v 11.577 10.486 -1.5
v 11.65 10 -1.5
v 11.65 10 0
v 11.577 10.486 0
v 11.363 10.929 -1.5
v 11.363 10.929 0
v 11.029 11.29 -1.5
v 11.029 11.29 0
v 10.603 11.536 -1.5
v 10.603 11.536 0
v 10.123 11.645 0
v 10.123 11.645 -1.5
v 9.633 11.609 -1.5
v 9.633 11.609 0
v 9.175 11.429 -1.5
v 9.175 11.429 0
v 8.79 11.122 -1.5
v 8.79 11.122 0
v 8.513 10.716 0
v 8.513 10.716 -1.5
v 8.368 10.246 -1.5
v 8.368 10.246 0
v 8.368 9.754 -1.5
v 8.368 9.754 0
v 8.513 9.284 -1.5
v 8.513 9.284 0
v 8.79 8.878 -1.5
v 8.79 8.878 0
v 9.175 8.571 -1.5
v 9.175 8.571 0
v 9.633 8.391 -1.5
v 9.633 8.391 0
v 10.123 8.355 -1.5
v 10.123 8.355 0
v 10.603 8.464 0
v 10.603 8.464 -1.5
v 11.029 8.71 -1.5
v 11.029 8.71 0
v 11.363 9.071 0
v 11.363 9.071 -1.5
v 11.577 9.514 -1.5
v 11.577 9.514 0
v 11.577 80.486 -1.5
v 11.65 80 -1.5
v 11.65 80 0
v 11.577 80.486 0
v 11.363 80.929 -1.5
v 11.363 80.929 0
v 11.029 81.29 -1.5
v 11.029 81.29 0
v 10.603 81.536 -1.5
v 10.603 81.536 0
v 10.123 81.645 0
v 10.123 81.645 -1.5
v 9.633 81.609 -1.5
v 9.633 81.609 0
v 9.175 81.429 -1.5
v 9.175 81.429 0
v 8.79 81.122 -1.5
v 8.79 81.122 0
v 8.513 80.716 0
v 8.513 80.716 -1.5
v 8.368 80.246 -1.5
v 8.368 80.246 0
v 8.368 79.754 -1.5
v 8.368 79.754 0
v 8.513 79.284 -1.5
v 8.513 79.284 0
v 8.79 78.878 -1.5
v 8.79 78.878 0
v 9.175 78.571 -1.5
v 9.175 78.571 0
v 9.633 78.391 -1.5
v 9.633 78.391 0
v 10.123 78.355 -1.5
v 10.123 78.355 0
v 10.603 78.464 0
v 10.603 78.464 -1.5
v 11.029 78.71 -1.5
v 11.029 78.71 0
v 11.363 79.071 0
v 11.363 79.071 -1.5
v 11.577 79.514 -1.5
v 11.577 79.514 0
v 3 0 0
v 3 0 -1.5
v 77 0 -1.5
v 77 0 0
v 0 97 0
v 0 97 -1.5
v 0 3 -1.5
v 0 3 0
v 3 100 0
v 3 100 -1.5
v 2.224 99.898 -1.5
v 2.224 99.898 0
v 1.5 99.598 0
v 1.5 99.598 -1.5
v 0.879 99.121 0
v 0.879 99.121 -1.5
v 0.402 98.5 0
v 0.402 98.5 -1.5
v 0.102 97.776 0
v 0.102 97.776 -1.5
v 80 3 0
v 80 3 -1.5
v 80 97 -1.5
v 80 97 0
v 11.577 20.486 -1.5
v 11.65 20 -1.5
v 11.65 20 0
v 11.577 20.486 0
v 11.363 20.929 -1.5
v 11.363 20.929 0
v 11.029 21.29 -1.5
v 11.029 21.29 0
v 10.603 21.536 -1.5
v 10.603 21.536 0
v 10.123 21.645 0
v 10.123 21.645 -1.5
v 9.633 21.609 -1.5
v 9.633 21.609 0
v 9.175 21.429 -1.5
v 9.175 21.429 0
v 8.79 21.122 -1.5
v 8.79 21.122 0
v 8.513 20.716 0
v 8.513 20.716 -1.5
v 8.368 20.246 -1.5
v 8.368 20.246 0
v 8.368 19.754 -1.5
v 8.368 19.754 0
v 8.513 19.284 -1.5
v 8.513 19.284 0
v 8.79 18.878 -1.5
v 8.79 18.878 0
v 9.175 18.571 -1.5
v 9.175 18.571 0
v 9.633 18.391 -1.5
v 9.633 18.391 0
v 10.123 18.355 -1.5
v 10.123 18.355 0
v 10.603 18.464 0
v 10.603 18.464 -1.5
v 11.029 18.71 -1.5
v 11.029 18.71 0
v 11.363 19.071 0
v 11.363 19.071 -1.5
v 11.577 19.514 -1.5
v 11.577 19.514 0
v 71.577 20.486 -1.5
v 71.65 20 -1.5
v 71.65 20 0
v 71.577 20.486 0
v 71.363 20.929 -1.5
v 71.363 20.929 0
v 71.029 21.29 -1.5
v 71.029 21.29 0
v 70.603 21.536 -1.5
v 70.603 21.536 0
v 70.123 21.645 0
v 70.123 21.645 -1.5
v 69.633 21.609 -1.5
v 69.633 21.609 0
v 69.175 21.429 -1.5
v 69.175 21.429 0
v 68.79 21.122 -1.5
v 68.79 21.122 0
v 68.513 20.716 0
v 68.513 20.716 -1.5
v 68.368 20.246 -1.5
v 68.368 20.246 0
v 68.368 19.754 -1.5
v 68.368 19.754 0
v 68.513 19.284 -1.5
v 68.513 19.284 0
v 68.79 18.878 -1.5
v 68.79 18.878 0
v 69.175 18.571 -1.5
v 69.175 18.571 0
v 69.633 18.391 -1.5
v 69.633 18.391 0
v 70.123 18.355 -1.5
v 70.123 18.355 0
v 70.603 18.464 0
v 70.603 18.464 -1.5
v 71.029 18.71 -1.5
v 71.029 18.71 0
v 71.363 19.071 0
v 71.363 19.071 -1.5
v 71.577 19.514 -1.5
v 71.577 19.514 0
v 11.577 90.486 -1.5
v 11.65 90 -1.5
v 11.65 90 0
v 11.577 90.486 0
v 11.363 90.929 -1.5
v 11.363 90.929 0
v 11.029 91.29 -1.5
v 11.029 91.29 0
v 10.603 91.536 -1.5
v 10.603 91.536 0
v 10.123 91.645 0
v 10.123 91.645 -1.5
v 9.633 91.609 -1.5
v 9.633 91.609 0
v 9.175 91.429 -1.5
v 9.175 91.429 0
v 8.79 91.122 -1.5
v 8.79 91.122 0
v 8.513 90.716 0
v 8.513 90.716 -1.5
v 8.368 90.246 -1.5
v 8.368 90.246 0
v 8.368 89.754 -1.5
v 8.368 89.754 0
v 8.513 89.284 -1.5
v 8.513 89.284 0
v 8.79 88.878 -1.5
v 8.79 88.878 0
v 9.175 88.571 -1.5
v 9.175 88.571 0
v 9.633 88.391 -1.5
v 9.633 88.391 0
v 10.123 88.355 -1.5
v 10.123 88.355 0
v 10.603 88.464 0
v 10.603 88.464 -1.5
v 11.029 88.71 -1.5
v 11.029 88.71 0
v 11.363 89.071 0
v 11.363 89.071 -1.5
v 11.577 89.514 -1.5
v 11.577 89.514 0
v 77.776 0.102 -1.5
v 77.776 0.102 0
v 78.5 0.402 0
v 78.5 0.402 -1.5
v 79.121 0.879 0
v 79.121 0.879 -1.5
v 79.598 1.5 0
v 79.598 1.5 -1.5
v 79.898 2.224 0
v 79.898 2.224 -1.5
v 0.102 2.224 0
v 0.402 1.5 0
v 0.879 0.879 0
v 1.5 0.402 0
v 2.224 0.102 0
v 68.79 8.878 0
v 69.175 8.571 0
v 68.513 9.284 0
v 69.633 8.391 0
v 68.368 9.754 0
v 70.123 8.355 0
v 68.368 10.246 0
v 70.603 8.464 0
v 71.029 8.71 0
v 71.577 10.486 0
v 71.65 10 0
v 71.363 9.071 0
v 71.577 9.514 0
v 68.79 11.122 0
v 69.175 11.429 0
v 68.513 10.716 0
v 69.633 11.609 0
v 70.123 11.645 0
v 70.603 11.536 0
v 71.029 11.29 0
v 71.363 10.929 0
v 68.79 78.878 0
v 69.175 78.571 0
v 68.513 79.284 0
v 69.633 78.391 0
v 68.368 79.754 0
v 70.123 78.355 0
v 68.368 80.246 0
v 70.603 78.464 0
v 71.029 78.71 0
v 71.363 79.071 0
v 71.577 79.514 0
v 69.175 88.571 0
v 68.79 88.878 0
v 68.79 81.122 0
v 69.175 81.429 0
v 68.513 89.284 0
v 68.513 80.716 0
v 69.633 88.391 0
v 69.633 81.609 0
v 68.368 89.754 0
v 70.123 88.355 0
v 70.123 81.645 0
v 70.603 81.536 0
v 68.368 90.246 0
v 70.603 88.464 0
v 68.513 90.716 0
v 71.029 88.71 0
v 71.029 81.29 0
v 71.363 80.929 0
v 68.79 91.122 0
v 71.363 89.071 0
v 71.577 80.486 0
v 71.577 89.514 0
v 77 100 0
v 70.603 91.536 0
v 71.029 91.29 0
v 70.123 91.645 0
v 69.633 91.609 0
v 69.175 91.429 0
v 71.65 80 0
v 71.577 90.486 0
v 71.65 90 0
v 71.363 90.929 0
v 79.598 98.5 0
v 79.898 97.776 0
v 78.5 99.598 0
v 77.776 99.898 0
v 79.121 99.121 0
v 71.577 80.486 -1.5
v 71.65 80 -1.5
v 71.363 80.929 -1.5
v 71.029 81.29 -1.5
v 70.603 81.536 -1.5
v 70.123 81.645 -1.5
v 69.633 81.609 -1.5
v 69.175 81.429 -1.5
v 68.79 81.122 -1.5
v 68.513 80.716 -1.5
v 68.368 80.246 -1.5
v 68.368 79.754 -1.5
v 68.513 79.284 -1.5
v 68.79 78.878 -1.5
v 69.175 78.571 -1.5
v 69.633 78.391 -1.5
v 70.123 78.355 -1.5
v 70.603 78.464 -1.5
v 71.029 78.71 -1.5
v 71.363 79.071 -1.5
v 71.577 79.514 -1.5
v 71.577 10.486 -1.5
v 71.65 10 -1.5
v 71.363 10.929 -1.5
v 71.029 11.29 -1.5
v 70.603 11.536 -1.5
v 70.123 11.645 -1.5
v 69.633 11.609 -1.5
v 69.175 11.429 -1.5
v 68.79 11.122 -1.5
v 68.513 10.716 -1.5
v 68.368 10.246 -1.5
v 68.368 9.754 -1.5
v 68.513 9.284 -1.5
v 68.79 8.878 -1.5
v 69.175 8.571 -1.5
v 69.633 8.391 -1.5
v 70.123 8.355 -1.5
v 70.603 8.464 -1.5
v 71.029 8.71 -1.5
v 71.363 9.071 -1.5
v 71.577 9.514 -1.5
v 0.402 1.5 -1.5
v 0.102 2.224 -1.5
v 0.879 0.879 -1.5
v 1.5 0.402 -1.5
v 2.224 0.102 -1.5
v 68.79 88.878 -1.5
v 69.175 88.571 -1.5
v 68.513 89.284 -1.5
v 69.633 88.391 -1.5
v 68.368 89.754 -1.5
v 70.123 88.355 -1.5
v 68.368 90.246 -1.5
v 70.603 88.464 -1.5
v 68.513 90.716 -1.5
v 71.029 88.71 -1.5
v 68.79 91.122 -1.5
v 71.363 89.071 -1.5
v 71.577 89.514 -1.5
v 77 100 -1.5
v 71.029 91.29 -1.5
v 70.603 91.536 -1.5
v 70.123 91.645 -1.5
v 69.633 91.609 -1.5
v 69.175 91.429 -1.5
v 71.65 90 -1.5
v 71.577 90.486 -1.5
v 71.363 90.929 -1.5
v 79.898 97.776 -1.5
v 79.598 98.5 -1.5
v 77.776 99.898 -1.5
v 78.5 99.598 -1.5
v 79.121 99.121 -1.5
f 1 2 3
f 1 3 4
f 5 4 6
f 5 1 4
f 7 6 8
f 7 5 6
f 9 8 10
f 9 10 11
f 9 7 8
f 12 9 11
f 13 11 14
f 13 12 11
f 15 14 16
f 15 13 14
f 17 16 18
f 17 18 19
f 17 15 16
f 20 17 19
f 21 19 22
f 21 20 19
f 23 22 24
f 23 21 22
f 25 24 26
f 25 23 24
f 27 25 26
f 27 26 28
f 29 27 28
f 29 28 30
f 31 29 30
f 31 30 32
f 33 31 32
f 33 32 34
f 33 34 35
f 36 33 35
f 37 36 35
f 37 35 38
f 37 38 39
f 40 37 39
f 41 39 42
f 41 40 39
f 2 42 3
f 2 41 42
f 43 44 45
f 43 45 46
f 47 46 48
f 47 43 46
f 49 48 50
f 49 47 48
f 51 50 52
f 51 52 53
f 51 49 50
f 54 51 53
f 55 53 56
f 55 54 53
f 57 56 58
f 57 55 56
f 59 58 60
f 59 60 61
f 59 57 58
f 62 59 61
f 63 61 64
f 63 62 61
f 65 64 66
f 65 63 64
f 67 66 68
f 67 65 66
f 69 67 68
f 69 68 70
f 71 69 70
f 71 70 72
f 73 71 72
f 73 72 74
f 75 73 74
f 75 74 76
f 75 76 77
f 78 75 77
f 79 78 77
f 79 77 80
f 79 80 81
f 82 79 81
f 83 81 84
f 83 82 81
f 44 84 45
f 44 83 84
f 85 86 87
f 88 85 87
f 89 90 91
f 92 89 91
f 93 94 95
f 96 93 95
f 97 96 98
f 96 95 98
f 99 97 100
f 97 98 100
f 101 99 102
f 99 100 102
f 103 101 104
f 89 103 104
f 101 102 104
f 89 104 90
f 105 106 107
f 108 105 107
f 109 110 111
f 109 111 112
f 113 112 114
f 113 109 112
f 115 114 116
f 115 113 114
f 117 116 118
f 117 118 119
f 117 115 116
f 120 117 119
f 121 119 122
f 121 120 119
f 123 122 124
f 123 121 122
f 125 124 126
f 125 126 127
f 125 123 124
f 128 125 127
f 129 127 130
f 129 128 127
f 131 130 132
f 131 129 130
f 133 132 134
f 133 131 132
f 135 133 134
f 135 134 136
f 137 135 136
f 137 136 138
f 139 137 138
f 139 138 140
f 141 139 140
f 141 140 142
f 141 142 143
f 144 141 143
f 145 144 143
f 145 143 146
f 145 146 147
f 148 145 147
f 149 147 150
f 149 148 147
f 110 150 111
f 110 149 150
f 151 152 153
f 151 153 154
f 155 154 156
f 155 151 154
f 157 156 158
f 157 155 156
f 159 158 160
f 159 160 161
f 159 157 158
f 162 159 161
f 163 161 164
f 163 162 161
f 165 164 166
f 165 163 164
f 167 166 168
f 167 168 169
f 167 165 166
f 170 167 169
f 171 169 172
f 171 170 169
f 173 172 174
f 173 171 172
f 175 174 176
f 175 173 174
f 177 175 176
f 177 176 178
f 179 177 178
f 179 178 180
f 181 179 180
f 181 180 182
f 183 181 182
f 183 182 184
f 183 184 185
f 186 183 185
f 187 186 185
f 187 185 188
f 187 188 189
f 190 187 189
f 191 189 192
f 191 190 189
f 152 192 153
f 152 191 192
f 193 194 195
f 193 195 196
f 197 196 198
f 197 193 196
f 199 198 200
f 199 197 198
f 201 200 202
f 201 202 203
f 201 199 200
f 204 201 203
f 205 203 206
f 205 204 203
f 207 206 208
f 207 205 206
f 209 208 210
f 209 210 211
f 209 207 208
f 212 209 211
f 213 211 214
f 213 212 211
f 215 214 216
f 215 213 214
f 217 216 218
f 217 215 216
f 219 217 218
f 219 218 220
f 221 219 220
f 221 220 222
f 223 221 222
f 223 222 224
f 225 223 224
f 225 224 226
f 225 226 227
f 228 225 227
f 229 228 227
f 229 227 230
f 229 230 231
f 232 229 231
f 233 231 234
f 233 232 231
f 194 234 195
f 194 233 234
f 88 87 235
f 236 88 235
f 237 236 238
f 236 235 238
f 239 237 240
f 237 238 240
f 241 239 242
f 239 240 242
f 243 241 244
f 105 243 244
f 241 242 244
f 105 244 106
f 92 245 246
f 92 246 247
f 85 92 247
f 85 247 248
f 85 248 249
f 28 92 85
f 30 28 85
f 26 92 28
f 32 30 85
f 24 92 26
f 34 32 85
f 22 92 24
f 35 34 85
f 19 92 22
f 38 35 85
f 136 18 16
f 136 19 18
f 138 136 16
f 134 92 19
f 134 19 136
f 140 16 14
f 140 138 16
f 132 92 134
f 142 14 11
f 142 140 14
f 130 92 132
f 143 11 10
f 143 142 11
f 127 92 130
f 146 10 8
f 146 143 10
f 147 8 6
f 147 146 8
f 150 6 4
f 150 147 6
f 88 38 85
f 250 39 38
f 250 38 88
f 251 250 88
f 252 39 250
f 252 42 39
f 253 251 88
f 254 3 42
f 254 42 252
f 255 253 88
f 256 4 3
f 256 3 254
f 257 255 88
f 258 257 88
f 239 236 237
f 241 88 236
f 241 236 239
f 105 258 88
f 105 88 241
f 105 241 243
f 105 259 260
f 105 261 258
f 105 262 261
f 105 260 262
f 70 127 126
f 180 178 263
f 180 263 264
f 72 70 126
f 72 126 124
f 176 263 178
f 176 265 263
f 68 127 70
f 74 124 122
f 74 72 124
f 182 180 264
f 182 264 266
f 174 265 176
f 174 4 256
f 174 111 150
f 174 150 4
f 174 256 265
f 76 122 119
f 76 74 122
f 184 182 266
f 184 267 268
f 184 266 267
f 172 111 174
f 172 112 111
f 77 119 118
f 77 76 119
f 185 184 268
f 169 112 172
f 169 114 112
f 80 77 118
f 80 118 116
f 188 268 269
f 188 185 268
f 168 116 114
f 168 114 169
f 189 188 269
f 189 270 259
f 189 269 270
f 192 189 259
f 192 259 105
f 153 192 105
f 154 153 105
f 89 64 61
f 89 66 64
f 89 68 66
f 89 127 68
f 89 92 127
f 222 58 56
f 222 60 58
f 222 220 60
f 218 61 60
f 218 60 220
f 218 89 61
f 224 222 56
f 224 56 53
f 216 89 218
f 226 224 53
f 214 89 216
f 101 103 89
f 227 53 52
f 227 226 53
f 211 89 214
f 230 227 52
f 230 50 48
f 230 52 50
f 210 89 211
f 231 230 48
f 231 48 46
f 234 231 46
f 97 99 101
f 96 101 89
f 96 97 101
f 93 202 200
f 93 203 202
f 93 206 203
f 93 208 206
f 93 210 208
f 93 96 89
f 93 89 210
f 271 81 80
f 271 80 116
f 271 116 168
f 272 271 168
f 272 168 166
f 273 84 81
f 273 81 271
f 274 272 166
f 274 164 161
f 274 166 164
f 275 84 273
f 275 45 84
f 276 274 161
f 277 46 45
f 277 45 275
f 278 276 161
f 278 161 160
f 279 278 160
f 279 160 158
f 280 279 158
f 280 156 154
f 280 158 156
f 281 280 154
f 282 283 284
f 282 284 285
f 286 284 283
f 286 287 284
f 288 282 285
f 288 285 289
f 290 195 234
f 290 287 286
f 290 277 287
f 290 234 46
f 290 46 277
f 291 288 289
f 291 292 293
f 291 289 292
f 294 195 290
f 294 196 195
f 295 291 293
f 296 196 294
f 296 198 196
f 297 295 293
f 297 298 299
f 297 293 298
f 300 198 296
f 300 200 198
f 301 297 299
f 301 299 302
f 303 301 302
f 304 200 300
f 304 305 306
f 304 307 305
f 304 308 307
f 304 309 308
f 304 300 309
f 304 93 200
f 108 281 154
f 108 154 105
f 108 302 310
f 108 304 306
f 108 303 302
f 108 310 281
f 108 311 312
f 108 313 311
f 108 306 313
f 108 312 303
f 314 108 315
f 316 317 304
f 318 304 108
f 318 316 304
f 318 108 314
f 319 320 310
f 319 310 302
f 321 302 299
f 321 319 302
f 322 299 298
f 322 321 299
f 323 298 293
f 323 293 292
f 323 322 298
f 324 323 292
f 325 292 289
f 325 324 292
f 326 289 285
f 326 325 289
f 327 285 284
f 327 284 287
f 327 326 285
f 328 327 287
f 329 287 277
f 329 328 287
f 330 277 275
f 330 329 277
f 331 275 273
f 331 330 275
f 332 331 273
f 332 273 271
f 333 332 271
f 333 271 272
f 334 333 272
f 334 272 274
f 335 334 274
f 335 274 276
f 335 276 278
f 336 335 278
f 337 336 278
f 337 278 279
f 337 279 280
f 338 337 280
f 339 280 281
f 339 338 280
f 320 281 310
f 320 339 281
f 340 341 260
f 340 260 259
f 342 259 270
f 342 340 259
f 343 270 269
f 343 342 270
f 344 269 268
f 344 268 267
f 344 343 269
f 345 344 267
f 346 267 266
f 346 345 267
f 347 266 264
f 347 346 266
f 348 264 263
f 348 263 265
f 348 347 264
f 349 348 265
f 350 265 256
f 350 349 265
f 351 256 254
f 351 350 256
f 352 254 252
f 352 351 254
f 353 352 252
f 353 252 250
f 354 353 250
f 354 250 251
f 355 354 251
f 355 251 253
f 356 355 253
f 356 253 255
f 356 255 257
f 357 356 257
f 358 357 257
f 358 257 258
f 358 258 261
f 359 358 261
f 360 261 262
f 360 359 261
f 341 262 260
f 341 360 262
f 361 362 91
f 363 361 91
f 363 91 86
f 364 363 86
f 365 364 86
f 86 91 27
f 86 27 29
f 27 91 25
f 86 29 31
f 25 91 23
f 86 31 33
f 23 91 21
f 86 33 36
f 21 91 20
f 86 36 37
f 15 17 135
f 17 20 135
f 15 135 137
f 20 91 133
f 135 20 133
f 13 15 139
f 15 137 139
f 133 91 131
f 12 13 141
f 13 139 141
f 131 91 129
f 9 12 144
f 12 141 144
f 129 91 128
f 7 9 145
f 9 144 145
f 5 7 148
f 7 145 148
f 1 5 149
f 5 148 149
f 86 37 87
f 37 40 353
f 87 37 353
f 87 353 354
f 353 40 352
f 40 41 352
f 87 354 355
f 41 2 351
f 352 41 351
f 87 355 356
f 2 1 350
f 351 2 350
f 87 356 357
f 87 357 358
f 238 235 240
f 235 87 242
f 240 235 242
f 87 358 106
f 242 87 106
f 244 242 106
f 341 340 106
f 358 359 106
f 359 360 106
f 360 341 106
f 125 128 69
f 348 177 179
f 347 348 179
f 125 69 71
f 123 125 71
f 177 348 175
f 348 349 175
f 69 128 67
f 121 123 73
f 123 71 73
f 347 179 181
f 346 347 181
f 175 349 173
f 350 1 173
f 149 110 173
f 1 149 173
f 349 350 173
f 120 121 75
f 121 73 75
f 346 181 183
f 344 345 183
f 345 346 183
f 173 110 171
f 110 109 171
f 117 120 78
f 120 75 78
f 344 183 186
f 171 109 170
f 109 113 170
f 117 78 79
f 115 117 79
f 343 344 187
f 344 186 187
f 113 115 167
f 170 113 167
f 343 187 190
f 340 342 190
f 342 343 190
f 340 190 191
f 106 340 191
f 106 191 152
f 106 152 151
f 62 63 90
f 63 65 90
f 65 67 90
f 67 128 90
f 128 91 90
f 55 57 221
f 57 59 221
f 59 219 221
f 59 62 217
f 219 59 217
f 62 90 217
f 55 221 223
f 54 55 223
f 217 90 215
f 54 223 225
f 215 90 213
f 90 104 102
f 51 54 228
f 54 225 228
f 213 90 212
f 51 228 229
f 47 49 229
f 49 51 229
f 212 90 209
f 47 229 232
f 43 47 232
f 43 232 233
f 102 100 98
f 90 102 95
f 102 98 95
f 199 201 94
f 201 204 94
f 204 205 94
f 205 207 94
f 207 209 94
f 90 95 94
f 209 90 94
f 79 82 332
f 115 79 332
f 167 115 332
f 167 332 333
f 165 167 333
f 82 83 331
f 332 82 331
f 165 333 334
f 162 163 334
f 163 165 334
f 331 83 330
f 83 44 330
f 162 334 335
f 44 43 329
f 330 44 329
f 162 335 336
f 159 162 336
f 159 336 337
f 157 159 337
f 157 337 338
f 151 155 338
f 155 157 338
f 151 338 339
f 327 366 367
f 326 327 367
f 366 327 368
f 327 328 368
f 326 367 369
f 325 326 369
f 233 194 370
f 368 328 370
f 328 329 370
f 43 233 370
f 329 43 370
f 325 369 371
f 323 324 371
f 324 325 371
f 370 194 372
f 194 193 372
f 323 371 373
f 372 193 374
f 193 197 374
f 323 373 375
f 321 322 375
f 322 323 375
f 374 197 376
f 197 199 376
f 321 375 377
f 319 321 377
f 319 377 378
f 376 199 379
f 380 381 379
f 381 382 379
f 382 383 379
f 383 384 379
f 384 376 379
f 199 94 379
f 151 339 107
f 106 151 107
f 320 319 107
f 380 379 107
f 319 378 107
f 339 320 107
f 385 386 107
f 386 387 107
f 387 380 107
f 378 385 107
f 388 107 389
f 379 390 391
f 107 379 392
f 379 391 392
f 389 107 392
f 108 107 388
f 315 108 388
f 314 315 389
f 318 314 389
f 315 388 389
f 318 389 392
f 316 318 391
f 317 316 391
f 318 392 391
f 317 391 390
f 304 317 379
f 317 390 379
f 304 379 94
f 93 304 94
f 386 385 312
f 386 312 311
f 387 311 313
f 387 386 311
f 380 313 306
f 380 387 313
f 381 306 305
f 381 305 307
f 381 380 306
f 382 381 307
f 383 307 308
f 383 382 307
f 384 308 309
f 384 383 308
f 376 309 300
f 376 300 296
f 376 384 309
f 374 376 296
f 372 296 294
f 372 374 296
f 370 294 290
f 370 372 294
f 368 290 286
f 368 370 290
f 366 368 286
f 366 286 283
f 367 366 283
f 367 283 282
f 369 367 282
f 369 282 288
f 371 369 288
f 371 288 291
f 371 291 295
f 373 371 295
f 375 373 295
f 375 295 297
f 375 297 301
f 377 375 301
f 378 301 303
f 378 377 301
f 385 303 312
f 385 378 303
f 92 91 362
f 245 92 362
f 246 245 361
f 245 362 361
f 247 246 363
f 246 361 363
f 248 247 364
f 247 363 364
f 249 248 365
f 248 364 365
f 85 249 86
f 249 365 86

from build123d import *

# Parameters (mm, degrees)
CONVERT_SOLID1_START     = -1.5
CONVERT_SOLID1_OUTLINE_R = 1.65
CONVERT_SOLID1_DEPTH     = 1.5


# Read off the part's stored shape, not the designer's step: Convert-Solid1
with BuildPart() as part:
    # Convert-Solid1 outline → Convert-Solid1 (new body)
    with BuildSketch(Plane.XY.offset(CONVERT_SOLID1_START)):
        with BuildLine():
            Line((80, 3), (80, 97))
            ThreePointArc((80, 97), (79.121320344, 99.121320344), (77, 100))
            Line((77, 100), (3, 100))
            ThreePointArc((3, 100), (0.878679656, 99.121320344), (0, 97))
            Line((0, 97), (0, 3))
            ThreePointArc((0, 3), (0.878679656, 0.878679656), (3, 0))
            Line((3, 0), (77, 0))
            ThreePointArc((77, 0), (79.121320344, 0.878679656), (80, 3))
        make_face()
        with Locations((10, 10)):
            Circle(CONVERT_SOLID1_OUTLINE_R, mode=Mode.SUBTRACT)
        with Locations((10, 20)):
            Circle(CONVERT_SOLID1_OUTLINE_R, mode=Mode.SUBTRACT)
        with Locations((70, 10)):
            Circle(CONVERT_SOLID1_OUTLINE_R, mode=Mode.SUBTRACT)
        with Locations((70, 20)):
            Circle(CONVERT_SOLID1_OUTLINE_R, mode=Mode.SUBTRACT)
        with Locations((10, 80)):
            Circle(CONVERT_SOLID1_OUTLINE_R, mode=Mode.SUBTRACT)
        with Locations((10, 90)):
            Circle(CONVERT_SOLID1_OUTLINE_R, mode=Mode.SUBTRACT)
        with Locations((70, 80)):
            Circle(CONVERT_SOLID1_OUTLINE_R, mode=Mode.SUBTRACT)
        with Locations((70, 90)):
            Circle(CONVERT_SOLID1_OUTLINE_R, mode=Mode.SUBTRACT)
    extrude(amount=CONVERT_SOLID1_DEPTH)


solid = part.part
